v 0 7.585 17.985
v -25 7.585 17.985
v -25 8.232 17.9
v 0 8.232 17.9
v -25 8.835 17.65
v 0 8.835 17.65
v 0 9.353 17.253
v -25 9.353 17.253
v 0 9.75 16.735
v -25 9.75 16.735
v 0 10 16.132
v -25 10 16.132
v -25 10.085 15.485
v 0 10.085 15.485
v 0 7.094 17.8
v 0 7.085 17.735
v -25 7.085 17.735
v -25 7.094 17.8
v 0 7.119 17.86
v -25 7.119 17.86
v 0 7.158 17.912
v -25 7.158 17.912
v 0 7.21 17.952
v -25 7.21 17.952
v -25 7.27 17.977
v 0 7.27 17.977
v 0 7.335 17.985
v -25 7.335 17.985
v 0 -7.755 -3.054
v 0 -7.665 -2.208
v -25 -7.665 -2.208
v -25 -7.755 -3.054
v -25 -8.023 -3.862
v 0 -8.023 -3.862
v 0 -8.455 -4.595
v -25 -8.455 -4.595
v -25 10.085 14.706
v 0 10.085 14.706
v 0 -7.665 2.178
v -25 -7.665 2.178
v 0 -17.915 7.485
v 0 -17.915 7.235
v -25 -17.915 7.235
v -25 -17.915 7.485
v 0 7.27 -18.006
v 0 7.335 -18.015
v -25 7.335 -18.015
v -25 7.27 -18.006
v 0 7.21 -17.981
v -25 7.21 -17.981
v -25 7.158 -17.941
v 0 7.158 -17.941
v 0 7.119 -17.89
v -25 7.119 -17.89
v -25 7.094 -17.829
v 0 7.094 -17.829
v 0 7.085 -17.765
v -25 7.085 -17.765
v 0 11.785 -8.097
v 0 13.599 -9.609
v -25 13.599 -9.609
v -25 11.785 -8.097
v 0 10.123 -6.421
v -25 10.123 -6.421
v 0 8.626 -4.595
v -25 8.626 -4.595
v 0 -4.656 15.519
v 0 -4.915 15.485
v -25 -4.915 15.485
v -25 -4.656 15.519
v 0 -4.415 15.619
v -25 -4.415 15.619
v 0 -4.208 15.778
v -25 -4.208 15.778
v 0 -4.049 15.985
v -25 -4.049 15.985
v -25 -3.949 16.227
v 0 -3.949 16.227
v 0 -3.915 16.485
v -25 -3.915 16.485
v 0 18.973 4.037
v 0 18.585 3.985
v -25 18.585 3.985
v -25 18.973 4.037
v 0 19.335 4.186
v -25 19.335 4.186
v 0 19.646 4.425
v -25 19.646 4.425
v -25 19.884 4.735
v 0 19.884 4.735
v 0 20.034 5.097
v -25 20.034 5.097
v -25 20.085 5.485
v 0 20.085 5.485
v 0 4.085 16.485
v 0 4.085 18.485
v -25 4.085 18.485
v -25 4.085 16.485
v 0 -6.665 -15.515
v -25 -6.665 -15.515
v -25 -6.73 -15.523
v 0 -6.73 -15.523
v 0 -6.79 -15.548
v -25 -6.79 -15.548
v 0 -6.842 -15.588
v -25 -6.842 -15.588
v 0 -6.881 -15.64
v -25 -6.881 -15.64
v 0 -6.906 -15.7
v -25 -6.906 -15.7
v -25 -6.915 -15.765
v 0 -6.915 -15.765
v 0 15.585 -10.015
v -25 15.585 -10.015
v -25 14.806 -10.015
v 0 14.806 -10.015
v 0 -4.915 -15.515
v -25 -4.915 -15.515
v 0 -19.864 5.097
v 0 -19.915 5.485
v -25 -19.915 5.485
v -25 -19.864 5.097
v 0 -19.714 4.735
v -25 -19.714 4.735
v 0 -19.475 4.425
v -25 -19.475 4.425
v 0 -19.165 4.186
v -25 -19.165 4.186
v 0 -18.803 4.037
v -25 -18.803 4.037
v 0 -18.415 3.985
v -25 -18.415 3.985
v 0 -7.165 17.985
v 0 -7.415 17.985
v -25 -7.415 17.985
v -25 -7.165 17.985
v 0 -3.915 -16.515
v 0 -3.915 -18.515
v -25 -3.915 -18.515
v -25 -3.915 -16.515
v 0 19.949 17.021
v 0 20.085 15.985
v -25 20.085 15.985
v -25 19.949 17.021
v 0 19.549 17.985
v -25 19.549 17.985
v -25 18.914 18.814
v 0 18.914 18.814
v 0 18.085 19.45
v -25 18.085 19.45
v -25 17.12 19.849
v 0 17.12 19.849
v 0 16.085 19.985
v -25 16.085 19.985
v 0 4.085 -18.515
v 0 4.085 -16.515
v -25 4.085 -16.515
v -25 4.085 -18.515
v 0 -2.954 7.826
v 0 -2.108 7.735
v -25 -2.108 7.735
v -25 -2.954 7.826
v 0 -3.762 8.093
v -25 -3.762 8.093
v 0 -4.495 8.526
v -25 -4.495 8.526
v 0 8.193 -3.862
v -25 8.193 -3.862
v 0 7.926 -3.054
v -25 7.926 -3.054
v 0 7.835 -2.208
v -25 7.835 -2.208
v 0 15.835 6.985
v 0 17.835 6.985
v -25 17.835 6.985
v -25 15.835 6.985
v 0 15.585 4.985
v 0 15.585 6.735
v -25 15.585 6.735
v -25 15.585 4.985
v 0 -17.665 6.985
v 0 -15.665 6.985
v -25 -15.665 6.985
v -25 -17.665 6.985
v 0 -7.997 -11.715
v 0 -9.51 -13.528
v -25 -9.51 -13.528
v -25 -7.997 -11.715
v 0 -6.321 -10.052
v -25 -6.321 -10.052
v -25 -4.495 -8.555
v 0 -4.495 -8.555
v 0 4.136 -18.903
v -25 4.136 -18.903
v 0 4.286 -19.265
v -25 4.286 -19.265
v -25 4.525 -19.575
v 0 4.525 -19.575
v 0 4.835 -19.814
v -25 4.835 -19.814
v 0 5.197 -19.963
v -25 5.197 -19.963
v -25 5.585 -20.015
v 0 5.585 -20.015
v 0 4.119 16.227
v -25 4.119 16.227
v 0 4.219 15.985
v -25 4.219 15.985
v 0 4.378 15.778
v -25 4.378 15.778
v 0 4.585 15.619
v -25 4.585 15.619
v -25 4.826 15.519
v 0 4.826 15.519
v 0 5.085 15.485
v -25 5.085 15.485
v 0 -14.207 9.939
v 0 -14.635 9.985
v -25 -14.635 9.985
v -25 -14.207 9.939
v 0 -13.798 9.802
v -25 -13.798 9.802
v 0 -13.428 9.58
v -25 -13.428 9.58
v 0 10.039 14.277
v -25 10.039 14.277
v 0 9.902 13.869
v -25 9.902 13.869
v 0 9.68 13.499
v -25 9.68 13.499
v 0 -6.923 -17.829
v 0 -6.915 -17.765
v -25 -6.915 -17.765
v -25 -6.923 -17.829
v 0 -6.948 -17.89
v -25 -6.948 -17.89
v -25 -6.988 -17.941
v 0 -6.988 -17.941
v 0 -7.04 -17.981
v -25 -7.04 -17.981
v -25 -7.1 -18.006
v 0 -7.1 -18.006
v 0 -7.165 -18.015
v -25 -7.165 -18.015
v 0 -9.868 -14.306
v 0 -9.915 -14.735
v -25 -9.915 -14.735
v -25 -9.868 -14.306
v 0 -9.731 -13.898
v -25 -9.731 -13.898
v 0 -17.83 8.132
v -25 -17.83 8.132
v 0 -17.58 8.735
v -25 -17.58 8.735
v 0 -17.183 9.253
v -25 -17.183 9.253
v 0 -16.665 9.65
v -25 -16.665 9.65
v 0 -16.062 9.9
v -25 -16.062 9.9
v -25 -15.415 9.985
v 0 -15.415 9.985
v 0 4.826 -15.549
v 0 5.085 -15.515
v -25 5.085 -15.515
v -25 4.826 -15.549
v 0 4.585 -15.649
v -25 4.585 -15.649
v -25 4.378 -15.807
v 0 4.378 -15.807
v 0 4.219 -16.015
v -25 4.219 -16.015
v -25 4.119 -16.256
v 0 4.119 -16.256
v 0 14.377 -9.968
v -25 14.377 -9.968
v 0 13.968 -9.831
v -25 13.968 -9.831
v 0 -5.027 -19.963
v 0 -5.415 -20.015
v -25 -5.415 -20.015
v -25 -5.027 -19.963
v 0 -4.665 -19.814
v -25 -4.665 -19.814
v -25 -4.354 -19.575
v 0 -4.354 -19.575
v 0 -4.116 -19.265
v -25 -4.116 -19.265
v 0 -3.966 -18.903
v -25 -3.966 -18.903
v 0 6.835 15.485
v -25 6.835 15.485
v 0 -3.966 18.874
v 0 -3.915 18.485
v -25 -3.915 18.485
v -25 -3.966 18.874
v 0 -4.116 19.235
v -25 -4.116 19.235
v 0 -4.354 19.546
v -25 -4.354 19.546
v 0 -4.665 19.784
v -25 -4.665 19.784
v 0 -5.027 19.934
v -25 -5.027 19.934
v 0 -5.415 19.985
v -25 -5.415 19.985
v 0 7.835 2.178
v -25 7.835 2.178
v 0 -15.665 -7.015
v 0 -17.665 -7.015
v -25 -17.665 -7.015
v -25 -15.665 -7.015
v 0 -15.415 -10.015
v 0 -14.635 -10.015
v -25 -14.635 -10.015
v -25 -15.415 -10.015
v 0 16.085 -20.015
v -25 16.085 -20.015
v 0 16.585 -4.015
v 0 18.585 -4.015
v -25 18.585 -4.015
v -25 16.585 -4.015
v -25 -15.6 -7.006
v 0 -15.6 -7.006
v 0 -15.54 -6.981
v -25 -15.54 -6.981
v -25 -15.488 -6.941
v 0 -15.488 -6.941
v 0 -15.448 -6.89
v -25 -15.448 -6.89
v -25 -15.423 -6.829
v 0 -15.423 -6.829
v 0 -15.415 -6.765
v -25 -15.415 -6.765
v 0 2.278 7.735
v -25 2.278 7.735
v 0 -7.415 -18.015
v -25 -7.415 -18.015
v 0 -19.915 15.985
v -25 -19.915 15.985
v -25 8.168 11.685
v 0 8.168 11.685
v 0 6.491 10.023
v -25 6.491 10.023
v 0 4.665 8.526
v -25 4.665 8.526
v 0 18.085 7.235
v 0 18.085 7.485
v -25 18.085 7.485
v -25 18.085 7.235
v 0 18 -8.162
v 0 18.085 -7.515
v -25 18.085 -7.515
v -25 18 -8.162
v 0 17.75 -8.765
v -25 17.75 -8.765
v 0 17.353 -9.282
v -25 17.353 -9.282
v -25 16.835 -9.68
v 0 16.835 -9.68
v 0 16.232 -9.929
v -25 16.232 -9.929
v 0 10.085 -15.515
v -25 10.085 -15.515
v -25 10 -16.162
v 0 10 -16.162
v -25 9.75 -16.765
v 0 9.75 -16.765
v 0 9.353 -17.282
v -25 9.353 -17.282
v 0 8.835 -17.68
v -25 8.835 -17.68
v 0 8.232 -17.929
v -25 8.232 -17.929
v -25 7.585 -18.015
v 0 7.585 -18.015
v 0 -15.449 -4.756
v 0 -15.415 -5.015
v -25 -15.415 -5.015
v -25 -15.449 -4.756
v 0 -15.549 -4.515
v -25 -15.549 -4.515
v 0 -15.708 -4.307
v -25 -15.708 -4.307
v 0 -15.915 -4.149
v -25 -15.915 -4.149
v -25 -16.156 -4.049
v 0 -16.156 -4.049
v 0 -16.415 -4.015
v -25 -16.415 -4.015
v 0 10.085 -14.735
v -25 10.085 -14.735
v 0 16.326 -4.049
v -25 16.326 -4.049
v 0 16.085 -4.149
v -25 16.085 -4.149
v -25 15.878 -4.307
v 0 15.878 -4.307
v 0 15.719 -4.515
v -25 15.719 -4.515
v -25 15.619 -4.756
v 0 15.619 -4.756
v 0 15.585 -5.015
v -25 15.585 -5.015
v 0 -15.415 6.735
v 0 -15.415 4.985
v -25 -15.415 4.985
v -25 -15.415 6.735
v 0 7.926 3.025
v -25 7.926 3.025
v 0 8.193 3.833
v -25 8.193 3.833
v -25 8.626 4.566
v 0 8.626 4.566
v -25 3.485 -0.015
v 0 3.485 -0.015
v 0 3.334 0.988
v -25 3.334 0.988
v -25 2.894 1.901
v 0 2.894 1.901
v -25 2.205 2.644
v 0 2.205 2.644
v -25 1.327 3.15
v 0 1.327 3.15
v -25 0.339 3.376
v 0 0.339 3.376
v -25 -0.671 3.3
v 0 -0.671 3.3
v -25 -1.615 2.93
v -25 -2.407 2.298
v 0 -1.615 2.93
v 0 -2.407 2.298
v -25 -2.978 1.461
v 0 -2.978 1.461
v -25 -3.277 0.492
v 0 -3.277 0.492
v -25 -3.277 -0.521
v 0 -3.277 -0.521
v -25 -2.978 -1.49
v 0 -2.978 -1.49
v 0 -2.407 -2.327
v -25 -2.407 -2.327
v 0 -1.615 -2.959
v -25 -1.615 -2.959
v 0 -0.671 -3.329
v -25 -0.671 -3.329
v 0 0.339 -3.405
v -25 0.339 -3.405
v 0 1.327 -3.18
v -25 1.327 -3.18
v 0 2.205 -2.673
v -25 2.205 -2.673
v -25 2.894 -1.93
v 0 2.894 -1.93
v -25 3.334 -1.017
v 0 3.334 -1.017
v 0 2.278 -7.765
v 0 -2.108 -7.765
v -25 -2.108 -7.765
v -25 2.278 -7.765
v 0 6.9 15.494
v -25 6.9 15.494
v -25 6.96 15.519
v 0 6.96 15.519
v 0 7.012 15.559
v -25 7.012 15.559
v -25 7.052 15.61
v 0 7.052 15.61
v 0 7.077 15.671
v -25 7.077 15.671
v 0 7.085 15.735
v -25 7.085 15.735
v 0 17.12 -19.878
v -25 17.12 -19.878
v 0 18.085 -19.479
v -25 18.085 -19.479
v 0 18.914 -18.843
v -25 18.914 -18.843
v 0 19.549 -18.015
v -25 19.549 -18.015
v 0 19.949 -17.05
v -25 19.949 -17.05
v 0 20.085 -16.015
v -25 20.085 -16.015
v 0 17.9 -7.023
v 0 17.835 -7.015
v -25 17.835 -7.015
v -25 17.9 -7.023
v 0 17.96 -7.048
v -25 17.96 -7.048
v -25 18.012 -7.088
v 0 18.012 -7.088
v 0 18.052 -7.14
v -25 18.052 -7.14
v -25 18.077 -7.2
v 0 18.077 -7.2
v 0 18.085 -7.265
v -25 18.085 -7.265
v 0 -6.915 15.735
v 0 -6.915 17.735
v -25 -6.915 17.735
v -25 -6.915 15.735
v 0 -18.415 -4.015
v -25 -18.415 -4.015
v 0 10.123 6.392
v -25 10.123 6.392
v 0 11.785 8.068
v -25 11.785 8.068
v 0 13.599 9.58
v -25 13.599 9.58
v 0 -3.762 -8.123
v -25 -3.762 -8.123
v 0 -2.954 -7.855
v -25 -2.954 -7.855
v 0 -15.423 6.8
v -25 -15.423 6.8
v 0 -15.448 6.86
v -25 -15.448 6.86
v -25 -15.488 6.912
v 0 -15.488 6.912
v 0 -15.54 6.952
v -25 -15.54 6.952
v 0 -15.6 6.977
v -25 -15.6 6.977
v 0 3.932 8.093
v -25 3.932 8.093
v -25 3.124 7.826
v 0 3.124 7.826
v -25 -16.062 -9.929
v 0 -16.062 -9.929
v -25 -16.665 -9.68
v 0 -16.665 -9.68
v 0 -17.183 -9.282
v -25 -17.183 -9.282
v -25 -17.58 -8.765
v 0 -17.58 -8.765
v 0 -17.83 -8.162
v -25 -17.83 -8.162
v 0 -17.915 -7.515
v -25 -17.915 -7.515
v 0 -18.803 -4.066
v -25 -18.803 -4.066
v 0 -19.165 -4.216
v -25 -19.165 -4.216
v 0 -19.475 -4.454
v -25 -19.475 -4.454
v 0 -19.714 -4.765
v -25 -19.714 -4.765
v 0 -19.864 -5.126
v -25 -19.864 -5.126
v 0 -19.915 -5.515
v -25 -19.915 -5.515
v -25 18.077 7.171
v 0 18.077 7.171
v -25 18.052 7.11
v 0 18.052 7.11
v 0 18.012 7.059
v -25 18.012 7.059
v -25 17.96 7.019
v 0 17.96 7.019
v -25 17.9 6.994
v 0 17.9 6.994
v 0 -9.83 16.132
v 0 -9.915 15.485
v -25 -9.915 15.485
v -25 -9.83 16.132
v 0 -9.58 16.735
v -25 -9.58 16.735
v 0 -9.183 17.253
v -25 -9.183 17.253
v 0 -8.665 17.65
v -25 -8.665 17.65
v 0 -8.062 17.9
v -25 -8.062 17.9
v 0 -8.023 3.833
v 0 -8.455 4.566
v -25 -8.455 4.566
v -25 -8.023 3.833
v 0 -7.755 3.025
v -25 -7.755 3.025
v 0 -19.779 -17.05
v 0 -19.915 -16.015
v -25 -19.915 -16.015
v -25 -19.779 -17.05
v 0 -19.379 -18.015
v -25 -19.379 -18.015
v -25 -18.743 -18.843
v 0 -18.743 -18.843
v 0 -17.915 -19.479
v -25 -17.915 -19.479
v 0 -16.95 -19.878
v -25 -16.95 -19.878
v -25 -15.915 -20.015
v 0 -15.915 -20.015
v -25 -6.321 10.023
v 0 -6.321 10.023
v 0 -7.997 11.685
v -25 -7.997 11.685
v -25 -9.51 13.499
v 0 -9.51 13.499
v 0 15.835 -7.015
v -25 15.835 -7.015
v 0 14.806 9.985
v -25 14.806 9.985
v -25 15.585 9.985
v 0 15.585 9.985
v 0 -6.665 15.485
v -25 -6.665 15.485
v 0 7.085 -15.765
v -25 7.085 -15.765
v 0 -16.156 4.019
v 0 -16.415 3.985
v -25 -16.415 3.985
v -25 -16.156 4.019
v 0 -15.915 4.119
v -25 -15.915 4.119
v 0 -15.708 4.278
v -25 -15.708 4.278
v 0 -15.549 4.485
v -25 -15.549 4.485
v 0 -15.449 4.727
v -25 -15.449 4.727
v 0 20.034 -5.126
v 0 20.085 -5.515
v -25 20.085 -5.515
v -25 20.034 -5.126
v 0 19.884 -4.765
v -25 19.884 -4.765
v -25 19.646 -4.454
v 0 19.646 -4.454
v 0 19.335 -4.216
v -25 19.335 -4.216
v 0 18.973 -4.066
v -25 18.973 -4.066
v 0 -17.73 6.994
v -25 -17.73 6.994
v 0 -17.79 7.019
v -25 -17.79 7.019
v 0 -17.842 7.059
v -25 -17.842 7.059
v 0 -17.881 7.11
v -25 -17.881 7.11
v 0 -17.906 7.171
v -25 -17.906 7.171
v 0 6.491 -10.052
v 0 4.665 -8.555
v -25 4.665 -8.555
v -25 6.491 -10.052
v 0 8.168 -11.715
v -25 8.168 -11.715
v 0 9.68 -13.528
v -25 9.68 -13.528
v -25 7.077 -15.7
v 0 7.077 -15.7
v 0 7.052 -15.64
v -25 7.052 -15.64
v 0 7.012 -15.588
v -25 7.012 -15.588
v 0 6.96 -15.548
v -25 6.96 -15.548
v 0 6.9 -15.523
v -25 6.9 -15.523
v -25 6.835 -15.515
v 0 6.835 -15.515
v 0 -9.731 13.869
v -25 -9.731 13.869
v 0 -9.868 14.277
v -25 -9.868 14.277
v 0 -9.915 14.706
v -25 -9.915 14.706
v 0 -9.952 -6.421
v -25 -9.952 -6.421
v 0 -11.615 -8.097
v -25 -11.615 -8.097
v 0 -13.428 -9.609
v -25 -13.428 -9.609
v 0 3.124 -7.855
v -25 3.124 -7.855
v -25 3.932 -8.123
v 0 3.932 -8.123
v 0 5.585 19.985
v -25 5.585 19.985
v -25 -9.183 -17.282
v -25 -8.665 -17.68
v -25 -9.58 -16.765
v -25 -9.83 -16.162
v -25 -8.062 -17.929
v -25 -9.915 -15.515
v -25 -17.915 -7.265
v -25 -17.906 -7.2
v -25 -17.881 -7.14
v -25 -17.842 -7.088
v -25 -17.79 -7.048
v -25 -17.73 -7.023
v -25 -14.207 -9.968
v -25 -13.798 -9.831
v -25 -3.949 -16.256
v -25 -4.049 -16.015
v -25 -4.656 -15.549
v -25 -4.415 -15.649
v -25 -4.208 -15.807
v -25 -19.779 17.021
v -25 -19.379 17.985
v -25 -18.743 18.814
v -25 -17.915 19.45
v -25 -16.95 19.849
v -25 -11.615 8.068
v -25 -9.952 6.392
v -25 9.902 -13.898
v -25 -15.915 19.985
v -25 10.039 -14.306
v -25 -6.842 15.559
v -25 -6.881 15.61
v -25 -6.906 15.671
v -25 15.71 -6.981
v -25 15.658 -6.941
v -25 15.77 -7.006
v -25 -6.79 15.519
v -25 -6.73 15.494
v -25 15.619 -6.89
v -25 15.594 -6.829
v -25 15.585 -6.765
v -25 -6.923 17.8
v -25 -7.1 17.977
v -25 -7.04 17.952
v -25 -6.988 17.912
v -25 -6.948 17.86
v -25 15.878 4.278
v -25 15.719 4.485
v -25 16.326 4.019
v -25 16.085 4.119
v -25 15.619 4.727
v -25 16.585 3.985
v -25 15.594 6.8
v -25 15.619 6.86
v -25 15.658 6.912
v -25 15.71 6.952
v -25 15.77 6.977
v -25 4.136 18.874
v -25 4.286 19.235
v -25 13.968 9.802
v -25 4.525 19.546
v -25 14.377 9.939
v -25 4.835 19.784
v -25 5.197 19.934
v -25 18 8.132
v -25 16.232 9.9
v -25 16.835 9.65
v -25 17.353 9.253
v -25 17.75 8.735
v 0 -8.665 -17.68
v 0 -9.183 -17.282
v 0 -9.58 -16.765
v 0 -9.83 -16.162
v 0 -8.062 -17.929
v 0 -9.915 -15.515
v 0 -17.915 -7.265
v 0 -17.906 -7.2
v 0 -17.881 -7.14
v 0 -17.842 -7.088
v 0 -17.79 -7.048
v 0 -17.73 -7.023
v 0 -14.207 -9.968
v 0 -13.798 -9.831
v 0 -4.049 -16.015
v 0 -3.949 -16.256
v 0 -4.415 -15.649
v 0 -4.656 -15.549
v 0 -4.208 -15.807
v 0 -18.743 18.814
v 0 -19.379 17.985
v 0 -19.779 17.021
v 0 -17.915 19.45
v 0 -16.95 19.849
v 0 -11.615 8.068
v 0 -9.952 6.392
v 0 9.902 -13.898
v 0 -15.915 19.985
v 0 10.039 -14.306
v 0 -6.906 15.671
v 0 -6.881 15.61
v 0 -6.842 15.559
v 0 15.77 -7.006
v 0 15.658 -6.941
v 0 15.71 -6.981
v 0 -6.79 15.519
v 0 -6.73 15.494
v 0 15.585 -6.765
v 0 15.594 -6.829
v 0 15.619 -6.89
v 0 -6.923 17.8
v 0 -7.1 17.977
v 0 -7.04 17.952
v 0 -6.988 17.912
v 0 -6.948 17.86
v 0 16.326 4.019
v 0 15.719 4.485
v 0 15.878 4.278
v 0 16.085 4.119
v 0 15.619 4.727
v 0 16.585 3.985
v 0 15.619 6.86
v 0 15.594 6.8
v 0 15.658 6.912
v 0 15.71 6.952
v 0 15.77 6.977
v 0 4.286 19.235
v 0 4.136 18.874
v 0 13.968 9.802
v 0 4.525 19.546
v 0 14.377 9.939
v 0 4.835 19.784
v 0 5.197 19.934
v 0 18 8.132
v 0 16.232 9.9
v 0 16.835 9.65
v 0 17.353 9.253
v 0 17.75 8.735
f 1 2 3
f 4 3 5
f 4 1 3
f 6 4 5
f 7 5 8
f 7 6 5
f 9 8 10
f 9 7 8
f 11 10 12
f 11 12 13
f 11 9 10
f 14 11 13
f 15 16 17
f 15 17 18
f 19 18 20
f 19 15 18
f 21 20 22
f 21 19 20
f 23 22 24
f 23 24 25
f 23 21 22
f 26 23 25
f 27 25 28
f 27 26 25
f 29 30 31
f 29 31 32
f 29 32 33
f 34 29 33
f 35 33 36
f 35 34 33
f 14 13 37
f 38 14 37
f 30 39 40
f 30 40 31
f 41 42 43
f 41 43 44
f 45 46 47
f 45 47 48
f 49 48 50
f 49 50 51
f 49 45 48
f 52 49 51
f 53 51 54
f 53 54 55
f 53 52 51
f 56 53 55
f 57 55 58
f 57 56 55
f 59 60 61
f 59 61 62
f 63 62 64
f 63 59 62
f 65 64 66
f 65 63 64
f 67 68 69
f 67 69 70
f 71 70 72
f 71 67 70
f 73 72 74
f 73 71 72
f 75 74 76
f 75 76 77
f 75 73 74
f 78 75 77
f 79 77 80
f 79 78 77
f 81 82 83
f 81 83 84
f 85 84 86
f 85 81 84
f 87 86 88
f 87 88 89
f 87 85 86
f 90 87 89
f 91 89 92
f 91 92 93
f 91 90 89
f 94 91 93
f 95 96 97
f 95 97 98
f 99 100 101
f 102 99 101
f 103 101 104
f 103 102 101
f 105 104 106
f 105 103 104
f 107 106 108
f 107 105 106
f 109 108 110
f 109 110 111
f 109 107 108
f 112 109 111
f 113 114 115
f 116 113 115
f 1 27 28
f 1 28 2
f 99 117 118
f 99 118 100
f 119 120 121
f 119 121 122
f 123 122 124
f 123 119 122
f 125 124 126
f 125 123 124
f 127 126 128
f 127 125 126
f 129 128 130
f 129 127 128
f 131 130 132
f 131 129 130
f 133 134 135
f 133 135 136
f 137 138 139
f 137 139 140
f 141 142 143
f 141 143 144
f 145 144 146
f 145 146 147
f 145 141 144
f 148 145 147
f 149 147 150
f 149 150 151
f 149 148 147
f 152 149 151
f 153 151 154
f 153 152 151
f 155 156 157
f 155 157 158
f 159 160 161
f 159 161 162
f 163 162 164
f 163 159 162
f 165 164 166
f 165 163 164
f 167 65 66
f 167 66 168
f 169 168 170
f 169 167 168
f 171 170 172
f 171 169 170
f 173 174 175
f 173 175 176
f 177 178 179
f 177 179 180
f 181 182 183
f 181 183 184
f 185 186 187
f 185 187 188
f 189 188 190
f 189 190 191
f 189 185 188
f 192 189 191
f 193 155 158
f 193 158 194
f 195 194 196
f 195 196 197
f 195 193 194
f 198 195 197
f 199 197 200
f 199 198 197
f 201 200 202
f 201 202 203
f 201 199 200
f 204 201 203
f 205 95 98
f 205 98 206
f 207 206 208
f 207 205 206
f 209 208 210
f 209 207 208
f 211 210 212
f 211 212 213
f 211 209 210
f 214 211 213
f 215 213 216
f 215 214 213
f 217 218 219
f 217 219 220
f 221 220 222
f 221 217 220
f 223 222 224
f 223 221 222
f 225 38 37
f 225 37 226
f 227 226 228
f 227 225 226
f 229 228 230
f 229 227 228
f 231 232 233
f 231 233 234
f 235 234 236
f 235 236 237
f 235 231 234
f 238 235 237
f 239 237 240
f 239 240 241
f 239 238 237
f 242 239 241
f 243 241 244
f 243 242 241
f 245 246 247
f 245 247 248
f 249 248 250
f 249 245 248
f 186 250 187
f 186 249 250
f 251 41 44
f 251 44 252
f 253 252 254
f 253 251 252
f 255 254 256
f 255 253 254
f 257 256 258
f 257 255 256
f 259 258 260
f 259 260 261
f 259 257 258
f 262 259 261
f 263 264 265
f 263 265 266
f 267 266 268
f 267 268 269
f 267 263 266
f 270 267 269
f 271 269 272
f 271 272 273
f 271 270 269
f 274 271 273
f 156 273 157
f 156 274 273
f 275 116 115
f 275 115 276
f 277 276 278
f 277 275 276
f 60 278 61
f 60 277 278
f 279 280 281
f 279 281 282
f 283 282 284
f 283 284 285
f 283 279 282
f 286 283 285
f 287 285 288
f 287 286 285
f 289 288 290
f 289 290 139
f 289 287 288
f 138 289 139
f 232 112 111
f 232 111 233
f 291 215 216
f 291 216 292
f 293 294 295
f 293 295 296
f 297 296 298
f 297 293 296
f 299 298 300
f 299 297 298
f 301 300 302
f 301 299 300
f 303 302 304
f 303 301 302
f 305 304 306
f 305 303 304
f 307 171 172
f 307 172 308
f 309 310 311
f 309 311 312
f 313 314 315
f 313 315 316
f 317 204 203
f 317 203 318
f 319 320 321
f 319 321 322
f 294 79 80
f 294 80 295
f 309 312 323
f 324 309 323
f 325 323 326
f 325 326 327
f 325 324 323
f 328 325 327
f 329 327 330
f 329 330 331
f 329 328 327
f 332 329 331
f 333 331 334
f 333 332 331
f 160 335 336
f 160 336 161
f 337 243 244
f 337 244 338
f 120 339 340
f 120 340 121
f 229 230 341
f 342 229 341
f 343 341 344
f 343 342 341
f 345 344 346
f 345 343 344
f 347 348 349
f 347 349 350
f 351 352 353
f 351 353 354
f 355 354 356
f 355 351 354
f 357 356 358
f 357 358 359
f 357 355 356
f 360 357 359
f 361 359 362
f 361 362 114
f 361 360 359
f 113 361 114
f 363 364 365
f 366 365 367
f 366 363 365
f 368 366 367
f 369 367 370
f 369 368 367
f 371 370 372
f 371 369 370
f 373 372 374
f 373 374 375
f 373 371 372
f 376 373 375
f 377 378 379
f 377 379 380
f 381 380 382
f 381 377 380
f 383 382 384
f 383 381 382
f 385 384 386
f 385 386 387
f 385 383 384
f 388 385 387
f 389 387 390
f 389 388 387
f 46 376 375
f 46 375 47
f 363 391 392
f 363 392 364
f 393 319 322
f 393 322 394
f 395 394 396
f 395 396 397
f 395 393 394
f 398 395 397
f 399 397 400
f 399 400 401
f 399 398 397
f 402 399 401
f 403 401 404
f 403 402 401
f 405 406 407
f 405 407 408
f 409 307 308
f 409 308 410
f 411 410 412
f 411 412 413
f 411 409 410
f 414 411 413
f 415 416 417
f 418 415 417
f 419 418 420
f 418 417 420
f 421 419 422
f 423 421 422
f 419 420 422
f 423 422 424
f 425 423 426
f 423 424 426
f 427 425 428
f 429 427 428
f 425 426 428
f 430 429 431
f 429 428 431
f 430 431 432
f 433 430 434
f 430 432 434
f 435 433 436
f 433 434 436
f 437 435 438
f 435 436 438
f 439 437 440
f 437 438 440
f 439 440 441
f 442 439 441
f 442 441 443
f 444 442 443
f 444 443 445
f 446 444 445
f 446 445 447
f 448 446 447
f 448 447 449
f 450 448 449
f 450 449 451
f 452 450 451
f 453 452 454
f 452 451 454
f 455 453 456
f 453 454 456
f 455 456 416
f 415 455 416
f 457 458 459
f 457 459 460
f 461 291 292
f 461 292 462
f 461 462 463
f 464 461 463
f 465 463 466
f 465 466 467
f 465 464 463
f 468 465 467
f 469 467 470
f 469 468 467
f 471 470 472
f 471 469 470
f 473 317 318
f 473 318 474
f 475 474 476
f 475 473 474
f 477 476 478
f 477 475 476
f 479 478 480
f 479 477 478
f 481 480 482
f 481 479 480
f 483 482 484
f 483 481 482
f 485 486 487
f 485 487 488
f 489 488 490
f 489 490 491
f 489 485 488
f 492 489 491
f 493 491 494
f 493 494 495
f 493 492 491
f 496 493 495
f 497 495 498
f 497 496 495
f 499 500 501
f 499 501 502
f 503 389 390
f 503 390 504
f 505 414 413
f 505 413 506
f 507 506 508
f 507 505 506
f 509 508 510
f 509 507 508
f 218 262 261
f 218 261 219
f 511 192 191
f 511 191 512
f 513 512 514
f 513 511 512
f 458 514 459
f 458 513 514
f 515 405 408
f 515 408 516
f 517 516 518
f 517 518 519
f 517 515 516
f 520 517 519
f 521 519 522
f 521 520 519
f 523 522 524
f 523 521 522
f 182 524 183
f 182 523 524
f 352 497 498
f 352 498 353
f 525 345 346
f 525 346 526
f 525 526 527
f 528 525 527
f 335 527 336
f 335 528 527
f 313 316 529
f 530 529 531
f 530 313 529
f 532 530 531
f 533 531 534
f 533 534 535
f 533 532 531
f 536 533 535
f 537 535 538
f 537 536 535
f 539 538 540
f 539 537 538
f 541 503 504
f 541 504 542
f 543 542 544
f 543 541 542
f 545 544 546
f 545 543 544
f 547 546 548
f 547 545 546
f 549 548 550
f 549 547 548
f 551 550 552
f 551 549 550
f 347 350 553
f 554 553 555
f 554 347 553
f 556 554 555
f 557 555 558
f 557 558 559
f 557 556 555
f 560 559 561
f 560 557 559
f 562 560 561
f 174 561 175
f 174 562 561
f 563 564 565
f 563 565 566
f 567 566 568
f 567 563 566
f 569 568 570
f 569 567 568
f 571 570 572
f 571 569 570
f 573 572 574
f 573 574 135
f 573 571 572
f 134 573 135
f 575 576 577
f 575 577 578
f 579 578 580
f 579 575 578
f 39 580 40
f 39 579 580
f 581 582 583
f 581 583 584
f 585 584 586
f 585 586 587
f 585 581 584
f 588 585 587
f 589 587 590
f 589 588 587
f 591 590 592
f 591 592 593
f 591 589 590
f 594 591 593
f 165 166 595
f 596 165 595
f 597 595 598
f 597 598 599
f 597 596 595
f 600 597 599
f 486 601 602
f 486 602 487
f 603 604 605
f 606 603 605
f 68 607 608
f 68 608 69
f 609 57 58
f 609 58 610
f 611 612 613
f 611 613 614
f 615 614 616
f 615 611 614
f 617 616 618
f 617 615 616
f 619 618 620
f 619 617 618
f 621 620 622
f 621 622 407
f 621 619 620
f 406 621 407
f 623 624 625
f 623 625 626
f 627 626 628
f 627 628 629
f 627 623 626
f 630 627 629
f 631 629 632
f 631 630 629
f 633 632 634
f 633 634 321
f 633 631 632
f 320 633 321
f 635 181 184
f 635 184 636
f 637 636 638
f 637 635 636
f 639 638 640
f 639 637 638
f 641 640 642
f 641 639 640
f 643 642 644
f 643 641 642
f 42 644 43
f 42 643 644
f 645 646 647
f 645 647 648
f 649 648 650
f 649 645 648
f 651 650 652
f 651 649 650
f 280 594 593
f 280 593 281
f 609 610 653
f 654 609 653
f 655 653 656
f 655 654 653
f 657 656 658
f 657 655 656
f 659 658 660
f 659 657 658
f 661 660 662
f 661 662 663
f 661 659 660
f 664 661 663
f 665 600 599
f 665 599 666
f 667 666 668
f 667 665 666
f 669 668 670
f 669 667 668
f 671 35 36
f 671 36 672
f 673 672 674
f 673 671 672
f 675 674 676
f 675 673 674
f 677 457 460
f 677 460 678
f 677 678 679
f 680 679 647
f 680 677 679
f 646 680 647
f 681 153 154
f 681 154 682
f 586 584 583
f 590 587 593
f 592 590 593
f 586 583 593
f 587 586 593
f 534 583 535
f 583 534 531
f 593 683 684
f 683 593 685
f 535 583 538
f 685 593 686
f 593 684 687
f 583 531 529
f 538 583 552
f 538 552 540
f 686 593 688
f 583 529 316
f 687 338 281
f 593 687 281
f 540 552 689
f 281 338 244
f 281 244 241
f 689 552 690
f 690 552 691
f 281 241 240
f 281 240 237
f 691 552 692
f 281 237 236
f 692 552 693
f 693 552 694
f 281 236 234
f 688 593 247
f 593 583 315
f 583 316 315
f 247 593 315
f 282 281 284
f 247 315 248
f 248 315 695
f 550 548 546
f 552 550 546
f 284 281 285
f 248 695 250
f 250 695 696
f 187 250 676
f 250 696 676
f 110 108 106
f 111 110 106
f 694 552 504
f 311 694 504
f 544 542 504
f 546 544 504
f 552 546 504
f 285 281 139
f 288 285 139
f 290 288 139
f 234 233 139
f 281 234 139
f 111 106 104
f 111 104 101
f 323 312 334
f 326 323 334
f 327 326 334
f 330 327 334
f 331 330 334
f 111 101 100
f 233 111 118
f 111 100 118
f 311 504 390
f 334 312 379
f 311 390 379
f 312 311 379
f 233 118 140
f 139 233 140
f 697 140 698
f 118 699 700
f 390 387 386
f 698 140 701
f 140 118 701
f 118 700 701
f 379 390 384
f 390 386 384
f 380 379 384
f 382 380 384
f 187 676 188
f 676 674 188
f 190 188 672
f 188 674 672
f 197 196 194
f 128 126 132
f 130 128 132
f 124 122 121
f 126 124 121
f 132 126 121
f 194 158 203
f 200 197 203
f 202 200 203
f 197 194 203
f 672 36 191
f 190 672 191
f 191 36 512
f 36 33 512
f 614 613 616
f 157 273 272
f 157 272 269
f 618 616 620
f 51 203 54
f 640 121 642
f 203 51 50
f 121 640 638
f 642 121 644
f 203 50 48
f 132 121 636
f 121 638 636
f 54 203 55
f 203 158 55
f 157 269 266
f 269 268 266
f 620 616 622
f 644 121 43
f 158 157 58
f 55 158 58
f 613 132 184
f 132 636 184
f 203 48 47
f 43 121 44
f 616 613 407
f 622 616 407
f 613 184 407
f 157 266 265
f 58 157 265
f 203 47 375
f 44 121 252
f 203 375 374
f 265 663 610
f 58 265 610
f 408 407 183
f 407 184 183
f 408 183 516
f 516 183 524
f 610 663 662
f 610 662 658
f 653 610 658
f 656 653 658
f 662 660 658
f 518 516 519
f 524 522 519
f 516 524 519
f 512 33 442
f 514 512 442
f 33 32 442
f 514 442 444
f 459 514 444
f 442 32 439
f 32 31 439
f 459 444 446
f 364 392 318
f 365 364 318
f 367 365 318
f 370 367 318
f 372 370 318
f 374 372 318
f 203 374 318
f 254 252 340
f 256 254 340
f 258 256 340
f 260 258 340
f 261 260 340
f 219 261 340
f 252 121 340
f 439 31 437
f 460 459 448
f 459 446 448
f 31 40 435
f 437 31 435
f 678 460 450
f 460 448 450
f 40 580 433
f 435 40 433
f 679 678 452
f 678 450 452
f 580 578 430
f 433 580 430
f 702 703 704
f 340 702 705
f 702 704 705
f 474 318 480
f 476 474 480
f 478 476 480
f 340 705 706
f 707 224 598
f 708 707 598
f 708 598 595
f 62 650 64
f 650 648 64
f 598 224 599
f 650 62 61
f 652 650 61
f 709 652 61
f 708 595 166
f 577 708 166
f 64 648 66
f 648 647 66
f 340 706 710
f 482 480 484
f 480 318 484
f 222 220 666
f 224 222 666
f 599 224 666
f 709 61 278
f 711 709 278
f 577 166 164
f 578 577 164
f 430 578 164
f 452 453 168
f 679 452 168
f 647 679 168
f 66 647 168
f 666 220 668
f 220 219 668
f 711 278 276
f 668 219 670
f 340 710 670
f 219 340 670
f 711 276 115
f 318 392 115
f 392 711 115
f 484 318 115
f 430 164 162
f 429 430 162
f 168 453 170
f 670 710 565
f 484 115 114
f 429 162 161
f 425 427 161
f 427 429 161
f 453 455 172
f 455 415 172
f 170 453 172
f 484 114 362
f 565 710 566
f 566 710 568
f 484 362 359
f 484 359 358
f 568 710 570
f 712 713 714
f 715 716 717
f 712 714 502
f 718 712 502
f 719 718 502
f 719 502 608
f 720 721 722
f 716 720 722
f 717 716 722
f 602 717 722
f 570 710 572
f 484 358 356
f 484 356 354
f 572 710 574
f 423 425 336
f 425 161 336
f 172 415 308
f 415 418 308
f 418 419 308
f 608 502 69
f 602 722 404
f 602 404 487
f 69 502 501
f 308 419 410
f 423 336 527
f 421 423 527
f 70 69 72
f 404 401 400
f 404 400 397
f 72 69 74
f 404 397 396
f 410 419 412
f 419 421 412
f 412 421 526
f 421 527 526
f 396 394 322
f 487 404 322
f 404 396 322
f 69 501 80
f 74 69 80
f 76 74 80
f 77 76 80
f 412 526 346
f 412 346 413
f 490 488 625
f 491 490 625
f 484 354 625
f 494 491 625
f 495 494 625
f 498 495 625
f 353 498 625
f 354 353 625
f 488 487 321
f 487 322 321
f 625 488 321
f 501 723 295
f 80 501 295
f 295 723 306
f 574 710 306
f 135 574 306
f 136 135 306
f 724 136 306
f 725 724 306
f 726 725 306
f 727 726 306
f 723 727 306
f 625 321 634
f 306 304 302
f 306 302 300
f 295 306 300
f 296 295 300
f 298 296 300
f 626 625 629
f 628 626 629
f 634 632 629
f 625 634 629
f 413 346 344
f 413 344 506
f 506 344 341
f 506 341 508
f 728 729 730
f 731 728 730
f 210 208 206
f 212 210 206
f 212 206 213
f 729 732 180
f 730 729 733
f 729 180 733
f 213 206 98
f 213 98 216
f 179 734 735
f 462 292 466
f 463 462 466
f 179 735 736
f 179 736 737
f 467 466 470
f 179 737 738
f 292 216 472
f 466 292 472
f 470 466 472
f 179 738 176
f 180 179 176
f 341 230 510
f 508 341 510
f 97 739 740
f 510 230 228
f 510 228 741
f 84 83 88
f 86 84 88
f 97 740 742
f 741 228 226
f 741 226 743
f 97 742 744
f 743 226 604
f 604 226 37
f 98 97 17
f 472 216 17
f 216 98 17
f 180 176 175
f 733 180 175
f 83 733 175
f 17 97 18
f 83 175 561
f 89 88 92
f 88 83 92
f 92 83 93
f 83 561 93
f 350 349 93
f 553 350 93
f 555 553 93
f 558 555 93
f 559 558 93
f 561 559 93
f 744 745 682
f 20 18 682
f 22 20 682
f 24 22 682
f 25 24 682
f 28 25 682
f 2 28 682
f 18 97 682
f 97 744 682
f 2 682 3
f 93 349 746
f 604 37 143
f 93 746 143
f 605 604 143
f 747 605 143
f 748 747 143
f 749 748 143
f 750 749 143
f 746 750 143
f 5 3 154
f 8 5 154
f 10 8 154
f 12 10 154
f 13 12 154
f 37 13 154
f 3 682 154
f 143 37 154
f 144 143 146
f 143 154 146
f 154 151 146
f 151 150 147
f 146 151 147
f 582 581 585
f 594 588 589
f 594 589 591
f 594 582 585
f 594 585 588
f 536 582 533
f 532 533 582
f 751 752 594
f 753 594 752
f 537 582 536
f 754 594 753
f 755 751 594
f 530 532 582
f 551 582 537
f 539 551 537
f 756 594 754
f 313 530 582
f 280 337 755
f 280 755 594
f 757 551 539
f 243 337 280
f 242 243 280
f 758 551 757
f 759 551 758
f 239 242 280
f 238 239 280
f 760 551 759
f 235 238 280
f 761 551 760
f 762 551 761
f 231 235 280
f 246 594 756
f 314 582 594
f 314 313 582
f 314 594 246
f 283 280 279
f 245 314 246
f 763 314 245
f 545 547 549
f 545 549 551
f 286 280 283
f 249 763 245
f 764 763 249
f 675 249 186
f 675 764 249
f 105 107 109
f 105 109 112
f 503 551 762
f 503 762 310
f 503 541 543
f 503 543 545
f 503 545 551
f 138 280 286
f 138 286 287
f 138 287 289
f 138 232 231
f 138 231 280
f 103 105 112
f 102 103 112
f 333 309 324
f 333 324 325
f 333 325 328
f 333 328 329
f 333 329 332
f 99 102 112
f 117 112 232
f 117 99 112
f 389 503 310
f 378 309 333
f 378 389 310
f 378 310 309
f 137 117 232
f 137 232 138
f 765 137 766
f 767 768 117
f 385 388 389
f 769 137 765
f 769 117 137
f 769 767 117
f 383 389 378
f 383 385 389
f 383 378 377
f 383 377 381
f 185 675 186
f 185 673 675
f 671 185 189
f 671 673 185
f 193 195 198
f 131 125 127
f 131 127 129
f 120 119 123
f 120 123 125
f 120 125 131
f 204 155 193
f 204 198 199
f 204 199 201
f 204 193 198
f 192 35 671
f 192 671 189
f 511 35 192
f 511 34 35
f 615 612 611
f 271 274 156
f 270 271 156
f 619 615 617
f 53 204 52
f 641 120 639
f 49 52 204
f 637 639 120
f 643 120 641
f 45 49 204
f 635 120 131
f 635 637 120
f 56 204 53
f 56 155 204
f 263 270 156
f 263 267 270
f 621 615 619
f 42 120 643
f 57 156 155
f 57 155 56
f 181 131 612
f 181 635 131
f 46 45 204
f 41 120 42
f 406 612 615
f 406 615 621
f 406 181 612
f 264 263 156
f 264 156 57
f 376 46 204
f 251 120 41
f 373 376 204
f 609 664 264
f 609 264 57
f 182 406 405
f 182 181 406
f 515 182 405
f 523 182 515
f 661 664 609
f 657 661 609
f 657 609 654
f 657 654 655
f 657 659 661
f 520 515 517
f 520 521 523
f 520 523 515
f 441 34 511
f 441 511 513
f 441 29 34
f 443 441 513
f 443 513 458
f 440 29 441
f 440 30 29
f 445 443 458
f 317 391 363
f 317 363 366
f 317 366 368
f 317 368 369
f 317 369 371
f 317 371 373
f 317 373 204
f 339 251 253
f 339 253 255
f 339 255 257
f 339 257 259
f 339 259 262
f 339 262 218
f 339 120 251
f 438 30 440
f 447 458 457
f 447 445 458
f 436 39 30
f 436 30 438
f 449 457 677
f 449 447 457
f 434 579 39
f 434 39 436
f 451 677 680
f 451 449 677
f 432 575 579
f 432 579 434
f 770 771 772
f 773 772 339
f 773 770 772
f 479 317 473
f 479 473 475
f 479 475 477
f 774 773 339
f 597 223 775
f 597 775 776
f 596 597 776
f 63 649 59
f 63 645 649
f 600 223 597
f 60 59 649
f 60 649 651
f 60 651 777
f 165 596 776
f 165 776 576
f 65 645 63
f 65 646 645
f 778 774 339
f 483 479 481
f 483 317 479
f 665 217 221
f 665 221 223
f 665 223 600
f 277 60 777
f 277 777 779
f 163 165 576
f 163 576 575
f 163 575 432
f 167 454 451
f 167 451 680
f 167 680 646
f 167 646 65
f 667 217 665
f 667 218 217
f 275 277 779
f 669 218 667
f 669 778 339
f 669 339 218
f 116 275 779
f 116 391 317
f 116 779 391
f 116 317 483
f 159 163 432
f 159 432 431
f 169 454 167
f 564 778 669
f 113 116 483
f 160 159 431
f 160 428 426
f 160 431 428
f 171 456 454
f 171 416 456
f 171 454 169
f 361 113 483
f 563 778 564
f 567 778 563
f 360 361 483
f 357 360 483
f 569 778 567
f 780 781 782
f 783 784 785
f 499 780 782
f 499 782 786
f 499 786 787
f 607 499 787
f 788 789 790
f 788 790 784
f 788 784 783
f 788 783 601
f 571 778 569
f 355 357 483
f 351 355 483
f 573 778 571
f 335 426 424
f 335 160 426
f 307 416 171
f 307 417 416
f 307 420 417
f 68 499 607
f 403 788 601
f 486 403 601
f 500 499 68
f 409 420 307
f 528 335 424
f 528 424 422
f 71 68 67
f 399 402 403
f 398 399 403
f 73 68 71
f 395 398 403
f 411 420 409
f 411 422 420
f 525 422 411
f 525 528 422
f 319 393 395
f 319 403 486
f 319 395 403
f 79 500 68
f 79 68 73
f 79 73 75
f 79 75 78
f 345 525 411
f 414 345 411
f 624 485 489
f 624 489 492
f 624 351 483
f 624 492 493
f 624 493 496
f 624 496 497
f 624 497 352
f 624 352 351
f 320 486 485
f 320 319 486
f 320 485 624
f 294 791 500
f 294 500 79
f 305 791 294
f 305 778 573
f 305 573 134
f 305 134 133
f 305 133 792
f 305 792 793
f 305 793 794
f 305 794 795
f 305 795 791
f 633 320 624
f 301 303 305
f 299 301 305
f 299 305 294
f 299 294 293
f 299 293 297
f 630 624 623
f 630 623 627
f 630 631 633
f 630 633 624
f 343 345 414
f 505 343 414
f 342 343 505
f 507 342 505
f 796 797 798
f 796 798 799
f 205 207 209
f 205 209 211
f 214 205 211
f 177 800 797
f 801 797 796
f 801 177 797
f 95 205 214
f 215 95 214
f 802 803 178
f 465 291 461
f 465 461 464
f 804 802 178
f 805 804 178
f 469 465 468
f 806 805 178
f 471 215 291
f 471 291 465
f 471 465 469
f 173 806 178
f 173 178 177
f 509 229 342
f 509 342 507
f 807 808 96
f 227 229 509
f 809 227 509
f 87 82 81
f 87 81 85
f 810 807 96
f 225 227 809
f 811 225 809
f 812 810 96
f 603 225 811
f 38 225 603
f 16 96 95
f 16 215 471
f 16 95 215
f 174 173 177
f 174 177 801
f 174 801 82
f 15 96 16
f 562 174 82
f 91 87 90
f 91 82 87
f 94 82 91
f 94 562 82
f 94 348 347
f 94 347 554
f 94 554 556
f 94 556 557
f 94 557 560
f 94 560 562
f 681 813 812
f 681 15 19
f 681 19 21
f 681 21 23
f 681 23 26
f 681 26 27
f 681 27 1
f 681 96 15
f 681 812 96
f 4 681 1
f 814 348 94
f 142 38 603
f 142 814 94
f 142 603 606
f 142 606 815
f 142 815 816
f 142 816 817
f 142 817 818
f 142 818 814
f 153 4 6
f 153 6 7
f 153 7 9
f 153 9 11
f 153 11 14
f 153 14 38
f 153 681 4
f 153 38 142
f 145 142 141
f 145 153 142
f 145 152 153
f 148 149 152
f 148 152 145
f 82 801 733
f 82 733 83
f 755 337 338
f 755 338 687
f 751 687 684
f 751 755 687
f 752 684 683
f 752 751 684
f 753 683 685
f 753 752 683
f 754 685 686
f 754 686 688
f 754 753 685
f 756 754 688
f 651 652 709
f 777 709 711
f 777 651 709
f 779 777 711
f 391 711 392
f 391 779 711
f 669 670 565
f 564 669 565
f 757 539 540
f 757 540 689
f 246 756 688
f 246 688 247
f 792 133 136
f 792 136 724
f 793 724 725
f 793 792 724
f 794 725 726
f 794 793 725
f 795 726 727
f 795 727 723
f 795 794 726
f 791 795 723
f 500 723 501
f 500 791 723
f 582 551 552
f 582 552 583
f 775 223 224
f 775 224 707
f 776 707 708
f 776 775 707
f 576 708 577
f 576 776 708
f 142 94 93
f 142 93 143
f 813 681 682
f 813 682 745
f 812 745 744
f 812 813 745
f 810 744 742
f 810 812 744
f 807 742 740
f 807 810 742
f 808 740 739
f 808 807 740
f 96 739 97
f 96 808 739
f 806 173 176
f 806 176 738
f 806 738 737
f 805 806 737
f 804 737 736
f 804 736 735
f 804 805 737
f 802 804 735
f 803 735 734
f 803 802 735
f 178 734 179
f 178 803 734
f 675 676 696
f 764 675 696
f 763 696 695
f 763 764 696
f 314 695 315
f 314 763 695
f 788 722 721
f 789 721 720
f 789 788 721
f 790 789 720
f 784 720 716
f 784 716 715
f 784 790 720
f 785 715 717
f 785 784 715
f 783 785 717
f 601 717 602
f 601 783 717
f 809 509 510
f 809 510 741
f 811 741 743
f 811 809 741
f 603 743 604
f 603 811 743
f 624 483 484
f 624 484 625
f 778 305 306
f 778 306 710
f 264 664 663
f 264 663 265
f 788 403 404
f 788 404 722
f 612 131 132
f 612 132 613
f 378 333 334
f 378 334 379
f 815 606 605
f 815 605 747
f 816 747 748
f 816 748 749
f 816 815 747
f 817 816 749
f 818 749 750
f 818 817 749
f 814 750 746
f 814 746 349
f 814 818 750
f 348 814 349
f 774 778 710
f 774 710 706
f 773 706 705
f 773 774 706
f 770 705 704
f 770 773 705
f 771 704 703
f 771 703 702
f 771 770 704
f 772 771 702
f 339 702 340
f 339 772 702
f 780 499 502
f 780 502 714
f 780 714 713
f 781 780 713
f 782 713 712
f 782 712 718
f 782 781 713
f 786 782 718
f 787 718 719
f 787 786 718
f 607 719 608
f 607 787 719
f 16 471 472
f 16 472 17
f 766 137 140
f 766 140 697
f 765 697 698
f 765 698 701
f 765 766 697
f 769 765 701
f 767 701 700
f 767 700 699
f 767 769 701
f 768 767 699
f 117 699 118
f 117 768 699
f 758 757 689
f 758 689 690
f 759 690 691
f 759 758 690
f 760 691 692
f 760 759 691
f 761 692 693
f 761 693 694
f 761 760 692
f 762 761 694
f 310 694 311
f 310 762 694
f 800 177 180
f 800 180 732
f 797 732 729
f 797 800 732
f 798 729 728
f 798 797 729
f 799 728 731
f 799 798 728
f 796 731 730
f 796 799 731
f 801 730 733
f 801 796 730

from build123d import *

# Parameters (mm, degrees)
F0_R     = 3.4
F1_DEPTH = 25


with BuildPart() as f1:
    # F0 (on Right) → F1 (new body)
    with BuildSketch(Plane.YZ):
        with BuildLine():
            Line((4.085178, -16.514598), (4.085178, -18.514598))
            ThreePointArc((4.085178, -18.514598), (4.524518, -19.575258), (5.585178, -20.014598))
            Line((5.585178, -20.014598), (16.085178, -20.014598))
            ThreePointArc((16.085178, -20.014598), (18.913605, -18.843025), (20.085178, -16.014598))
            Line((20.085178, -16.014598), (20.085178, -5.514598))
            ThreePointArc((20.085178, -5.514598), (19.645838, -4.453938), (18.585178, -4.014598))
            Line((18.585178, -4.014598), (16.585178, -4.014598))
            ThreePointArc((16.585178, -4.014598), (15.878071, -4.307491), (15.585178, -5.014598))
            Line((15.585178, -5.014598), (15.585178, -6.764598))
            ThreePointArc((15.585178, -6.764598), (15.658401, -6.941375), (15.835178, -7.014598))
            Line((15.835178, -7.014598), (17.835178, -7.014598))
            ThreePointArc((17.835178, -7.014598), (18.011955, -7.087821), (18.085178, -7.264598))
            Line((18.085178, -7.264598), (18.085178, -7.514598))
            ThreePointArc((18.085178, -7.514598), (17.352945, -9.282365), (15.585178, -10.014598))
            Line((15.585178, -10.014598), (14.805538, -10.014598))
            ThreePointArc((14.805538, -10.014598), (14.168971, -9.910589), (13.598613, -9.609381))
            ThreePointArc((13.598613, -9.609381), (10.934174, -7.278628), (8.625654, -4.594903))
            ThreePointArc((8.625654, -4.594903), (8.037936, -3.465013), (7.835178, -2.207654))
            Line((7.835178, -2.207654), (7.835178, 2.178458))
            ThreePointArc((7.835178, 2.178458), (8.037936, 3.435818), (8.625654, 4.565707))
            ThreePointArc((8.625654, 4.565707), (10.934174, 7.249432), (13.598613, 9.580185))
            ThreePointArc((13.598613, 9.580185), (14.168971, 9.881393), (14.805538, 9.985402))
            Line((14.805538, 9.985402), (15.585178, 9.985402))
            ThreePointArc((15.585178, 9.985402), (17.352945, 9.253169), (18.085178, 7.485402))
            Line((18.085178, 7.485402), (18.085178, 7.235402))
            ThreePointArc((18.085178, 7.235402), (18.011955, 7.058625), (17.835178, 6.985402))
            Line((17.835178, 6.985402), (15.835178, 6.985402))
            ThreePointArc((15.835178, 6.985402), (15.658401, 6.912179), (15.585178, 6.735402))
            Line((15.585178, 6.735402), (15.585178, 4.985402))
            ThreePointArc((15.585178, 4.985402), (15.878071, 4.278295), (16.585178, 3.985402))
            Line((16.585178, 3.985402), (18.585178, 3.985402))
            ThreePointArc((18.585178, 3.985402), (19.645838, 4.424742), (20.085178, 5.485402))
            Line((20.085178, 5.485402), (20.085178, 15.985402))
            ThreePointArc((20.085178, 15.985402), (18.913605, 18.813829), (16.085178, 19.985402))
            Line((16.085178, 19.985402), (5.585178, 19.985402))
            ThreePointArc((5.585178, 19.985402), (4.524518, 19.546062), (4.085178, 18.485402))
            Line((4.085178, 18.485402), (4.085178, 16.485402))
            ThreePointArc((4.085178, 16.485402), (4.378071, 15.778295), (5.085178, 15.485402))
            Line((5.085178, 15.485402), (6.835178, 15.485402))
            ThreePointArc((6.835178, 15.485402), (7.011955, 15.558625), (7.085178, 15.735402))
            Line((7.085178, 15.735402), (7.085178, 17.735402))
            ThreePointArc((7.085178, 17.735402), (7.158401, 17.912179), (7.335178, 17.985402))
            Line((7.335178, 17.985402), (7.585178, 17.985402))
            ThreePointArc((7.585178, 17.985402), (9.352945, 17.253169), (10.085178, 15.485402))
            Line((10.085178, 15.485402), (10.085178, 14.705762))
            ThreePointArc((10.085178, 14.705762), (9.981169, 14.069195), (9.67996, 13.498837))
            ThreePointArc((9.67996, 13.498837), (7.349208, 10.834398), (4.665483, 8.525878))
            ThreePointArc((4.665483, 8.525878), (3.535593, 7.93816), (2.278234, 7.735402))
            Line((2.278234, 7.735402), (-2.107878, 7.735402))
            ThreePointArc((-2.107878, 7.735402), (-3.365238, 7.93816), (-4.495127, 8.525878))
            ThreePointArc((-4.495127, 8.525878), (-7.178852, 10.834398), (-9.509605, 13.498837))
            ThreePointArc((-9.509605, 13.498837), (-9.810813, 14.069195), (-9.914822, 14.705762))
            Line((-9.914822, 14.705762), (-9.914822, 15.485402))
            ThreePointArc((-9.914822, 15.485402), (-9.182589, 17.253169), (-7.414822, 17.985402))
            Line((-7.414822, 17.985402), (-7.164822, 17.985402))
            ThreePointArc((-7.164822, 17.985402), (-6.988045, 17.912179), (-6.914822, 17.735402))
            Line((-6.914822, 17.735402), (-6.914822, 15.735402))
            ThreePointArc((-6.914822, 15.735402), (-6.841599, 15.558625), (-6.664822, 15.485402))
            Line((-6.664822, 15.485402), (-4.914822, 15.485402))
            ThreePointArc((-4.914822, 15.485402), (-4.207715, 15.778295), (-3.914822, 16.485402))
            Line((-3.914822, 16.485402), (-3.914822, 18.485402))
            ThreePointArc((-3.914822, 18.485402), (-4.354162, 19.546062), (-5.414822, 19.985402))
            Line((-5.414822, 19.985402), (-15.914822, 19.985402))
            ThreePointArc((-15.914822, 19.985402), (-18.743249, 18.813829), (-19.914822, 15.985402))
            Line((-19.914822, 15.985402), (-19.914822, 5.485402))
            ThreePointArc((-19.914822, 5.485402), (-19.475482, 4.424742), (-18.414822, 3.985402))
            Line((-18.414822, 3.985402), (-16.414822, 3.985402))
            ThreePointArc((-16.414822, 3.985402), (-15.707715, 4.278295), (-15.414822, 4.985402))
            Line((-15.414822, 4.985402), (-15.414822, 6.735402))
            ThreePointArc((-15.414822, 6.735402), (-15.488045, 6.912179), (-15.664822, 6.985402))
            Line((-15.664822, 6.985402), (-17.664822, 6.985402))
            ThreePointArc((-17.664822, 6.985402), (-17.841599, 7.058625), (-17.914822, 7.235402))
            Line((-17.914822, 7.235402), (-17.914822, 7.485402))
            ThreePointArc((-17.914822, 7.485402), (-17.182589, 9.253169), (-15.414822, 9.985402))
            Line((-15.414822, 9.985402), (-14.635182, 9.985402))
            ThreePointArc((-14.635182, 9.985402), (-13.998616, 9.881393), (-13.428257, 9.580185))
            ThreePointArc((-13.428257, 9.580185), (-10.763818, 7.249432), (-8.455298, 4.565707))
            ThreePointArc((-8.455298, 4.565707), (-7.86758, 3.435818), (-7.664822, 2.178458))
            Line((-7.664822, 2.178458), (-7.664822, -2.207654))
            ThreePointArc((-7.664822, -2.207654), (-7.86758, -3.465013), (-8.455298, -4.594903))
            ThreePointArc((-8.455298, -4.594903), (-10.763818, -7.278628), (-13.428257, -9.609381))
            ThreePointArc((-13.428257, -9.609381), (-13.998616, -9.910589), (-14.635182, -10.014598))
            Line((-14.635182, -10.014598), (-15.414822, -10.014598))
            ThreePointArc((-15.414822, -10.014598), (-17.182589, -9.282365), (-17.914822, -7.514598))
            Line((-17.914822, -7.514598), (-17.914822, -7.264598))
            ThreePointArc((-17.914822, -7.264598), (-17.841599, -7.087821), (-17.664822, -7.014598))
            Line((-17.664822, -7.014598), (-15.664822, -7.014598))
            ThreePointArc((-15.664822, -7.014598), (-15.488045, -6.941375), (-15.414822, -6.764598))
            Line((-15.414822, -6.764598), (-15.414822, -5.014598))
            ThreePointArc((-15.414822, -5.014598), (-15.707715, -4.307491), (-16.414822, -4.014598))
            Line((-16.414822, -4.014598), (-18.414822, -4.014598))
            ThreePointArc((-18.414822, -4.014598), (-19.475482, -4.453938), (-19.914822, -5.514598))
            Line((-19.914822, -5.514598), (-19.914822, -16.014598))
            ThreePointArc((-19.914822, -16.014598), (-18.743249, -18.843025), (-15.914822, -20.014598))
            Line((-15.914822, -20.014598), (-5.414822, -20.014598))
            ThreePointArc((-5.414822, -20.014598), (-4.354162, -19.575258), (-3.914822, -18.514598))
            Line((-3.914822, -18.514598), (-3.914822, -16.514598))
            ThreePointArc((-3.914822, -16.514598), (-4.207715, -15.807491), (-4.914822, -15.514598))
            Line((-4.914822, -15.514598), (-6.664822, -15.514598))
            ThreePointArc((-6.664822, -15.514598), (-6.841599, -15.587821), (-6.914822, -15.764598))
            Line((-6.914822, -15.764598), (-6.914822, -17.764598))
            ThreePointArc((-6.914822, -17.764598), (-6.988045, -17.941375), (-7.164822, -18.014598))
            Line((-7.164822, -18.014598), (-7.414822, -18.014598))
            ThreePointArc((-7.414822, -18.014598), (-9.182589, -17.282365), (-9.914822, -15.514598))
            Line((-9.914822, -15.514598), (-9.914822, -14.734958))
            ThreePointArc((-9.914822, -14.734958), (-9.810813, -14.098391), (-9.509605, -13.528033))
            ThreePointArc((-9.509605, -13.528033), (-7.178852, -10.863594), (-4.495127, -8.555074))
            ThreePointArc((-4.495127, -8.555074), (-3.365238, -7.967356), (-2.107878, -7.764598))
            Line((-2.107878, -7.764598), (2.278234, -7.764598))
            ThreePointArc((2.278234, -7.764598), (3.535593, -7.967356), (4.665483, -8.555074))
            ThreePointArc((4.665483, -8.555074), (7.349208, -10.863594), (9.67996, -13.528033))
            ThreePointArc((9.67996, -13.528033), (9.981169, -14.098391), (10.085178, -14.734958))
            Line((10.085178, -14.734958), (10.085178, -15.514598))
            ThreePointArc((10.085178, -15.514598), (9.352945, -17.282365), (7.585178, -18.014598))
            Line((7.585178, -18.014598), (7.335178, -18.014598))
            ThreePointArc((7.335178, -18.014598), (7.158401, -17.941375), (7.085178, -17.764598))
            Line((7.085178, -17.764598), (7.085178, -15.764598))
            ThreePointArc((7.085178, -15.764598), (7.011955, -15.587821), (6.835178, -15.514598))
            Line((6.835178, -15.514598), (5.085178, -15.514598))
            ThreePointArc((5.085178, -15.514598), (4.378071, -15.807491), (4.085178, -16.514598))
        make_face()
        with Locations((0.085178, -0.014598)):
            Circle(F0_R, mode=Mode.SUBTRACT)
    extrude(amount=-F1_DEPTH)


solid = f1.part
